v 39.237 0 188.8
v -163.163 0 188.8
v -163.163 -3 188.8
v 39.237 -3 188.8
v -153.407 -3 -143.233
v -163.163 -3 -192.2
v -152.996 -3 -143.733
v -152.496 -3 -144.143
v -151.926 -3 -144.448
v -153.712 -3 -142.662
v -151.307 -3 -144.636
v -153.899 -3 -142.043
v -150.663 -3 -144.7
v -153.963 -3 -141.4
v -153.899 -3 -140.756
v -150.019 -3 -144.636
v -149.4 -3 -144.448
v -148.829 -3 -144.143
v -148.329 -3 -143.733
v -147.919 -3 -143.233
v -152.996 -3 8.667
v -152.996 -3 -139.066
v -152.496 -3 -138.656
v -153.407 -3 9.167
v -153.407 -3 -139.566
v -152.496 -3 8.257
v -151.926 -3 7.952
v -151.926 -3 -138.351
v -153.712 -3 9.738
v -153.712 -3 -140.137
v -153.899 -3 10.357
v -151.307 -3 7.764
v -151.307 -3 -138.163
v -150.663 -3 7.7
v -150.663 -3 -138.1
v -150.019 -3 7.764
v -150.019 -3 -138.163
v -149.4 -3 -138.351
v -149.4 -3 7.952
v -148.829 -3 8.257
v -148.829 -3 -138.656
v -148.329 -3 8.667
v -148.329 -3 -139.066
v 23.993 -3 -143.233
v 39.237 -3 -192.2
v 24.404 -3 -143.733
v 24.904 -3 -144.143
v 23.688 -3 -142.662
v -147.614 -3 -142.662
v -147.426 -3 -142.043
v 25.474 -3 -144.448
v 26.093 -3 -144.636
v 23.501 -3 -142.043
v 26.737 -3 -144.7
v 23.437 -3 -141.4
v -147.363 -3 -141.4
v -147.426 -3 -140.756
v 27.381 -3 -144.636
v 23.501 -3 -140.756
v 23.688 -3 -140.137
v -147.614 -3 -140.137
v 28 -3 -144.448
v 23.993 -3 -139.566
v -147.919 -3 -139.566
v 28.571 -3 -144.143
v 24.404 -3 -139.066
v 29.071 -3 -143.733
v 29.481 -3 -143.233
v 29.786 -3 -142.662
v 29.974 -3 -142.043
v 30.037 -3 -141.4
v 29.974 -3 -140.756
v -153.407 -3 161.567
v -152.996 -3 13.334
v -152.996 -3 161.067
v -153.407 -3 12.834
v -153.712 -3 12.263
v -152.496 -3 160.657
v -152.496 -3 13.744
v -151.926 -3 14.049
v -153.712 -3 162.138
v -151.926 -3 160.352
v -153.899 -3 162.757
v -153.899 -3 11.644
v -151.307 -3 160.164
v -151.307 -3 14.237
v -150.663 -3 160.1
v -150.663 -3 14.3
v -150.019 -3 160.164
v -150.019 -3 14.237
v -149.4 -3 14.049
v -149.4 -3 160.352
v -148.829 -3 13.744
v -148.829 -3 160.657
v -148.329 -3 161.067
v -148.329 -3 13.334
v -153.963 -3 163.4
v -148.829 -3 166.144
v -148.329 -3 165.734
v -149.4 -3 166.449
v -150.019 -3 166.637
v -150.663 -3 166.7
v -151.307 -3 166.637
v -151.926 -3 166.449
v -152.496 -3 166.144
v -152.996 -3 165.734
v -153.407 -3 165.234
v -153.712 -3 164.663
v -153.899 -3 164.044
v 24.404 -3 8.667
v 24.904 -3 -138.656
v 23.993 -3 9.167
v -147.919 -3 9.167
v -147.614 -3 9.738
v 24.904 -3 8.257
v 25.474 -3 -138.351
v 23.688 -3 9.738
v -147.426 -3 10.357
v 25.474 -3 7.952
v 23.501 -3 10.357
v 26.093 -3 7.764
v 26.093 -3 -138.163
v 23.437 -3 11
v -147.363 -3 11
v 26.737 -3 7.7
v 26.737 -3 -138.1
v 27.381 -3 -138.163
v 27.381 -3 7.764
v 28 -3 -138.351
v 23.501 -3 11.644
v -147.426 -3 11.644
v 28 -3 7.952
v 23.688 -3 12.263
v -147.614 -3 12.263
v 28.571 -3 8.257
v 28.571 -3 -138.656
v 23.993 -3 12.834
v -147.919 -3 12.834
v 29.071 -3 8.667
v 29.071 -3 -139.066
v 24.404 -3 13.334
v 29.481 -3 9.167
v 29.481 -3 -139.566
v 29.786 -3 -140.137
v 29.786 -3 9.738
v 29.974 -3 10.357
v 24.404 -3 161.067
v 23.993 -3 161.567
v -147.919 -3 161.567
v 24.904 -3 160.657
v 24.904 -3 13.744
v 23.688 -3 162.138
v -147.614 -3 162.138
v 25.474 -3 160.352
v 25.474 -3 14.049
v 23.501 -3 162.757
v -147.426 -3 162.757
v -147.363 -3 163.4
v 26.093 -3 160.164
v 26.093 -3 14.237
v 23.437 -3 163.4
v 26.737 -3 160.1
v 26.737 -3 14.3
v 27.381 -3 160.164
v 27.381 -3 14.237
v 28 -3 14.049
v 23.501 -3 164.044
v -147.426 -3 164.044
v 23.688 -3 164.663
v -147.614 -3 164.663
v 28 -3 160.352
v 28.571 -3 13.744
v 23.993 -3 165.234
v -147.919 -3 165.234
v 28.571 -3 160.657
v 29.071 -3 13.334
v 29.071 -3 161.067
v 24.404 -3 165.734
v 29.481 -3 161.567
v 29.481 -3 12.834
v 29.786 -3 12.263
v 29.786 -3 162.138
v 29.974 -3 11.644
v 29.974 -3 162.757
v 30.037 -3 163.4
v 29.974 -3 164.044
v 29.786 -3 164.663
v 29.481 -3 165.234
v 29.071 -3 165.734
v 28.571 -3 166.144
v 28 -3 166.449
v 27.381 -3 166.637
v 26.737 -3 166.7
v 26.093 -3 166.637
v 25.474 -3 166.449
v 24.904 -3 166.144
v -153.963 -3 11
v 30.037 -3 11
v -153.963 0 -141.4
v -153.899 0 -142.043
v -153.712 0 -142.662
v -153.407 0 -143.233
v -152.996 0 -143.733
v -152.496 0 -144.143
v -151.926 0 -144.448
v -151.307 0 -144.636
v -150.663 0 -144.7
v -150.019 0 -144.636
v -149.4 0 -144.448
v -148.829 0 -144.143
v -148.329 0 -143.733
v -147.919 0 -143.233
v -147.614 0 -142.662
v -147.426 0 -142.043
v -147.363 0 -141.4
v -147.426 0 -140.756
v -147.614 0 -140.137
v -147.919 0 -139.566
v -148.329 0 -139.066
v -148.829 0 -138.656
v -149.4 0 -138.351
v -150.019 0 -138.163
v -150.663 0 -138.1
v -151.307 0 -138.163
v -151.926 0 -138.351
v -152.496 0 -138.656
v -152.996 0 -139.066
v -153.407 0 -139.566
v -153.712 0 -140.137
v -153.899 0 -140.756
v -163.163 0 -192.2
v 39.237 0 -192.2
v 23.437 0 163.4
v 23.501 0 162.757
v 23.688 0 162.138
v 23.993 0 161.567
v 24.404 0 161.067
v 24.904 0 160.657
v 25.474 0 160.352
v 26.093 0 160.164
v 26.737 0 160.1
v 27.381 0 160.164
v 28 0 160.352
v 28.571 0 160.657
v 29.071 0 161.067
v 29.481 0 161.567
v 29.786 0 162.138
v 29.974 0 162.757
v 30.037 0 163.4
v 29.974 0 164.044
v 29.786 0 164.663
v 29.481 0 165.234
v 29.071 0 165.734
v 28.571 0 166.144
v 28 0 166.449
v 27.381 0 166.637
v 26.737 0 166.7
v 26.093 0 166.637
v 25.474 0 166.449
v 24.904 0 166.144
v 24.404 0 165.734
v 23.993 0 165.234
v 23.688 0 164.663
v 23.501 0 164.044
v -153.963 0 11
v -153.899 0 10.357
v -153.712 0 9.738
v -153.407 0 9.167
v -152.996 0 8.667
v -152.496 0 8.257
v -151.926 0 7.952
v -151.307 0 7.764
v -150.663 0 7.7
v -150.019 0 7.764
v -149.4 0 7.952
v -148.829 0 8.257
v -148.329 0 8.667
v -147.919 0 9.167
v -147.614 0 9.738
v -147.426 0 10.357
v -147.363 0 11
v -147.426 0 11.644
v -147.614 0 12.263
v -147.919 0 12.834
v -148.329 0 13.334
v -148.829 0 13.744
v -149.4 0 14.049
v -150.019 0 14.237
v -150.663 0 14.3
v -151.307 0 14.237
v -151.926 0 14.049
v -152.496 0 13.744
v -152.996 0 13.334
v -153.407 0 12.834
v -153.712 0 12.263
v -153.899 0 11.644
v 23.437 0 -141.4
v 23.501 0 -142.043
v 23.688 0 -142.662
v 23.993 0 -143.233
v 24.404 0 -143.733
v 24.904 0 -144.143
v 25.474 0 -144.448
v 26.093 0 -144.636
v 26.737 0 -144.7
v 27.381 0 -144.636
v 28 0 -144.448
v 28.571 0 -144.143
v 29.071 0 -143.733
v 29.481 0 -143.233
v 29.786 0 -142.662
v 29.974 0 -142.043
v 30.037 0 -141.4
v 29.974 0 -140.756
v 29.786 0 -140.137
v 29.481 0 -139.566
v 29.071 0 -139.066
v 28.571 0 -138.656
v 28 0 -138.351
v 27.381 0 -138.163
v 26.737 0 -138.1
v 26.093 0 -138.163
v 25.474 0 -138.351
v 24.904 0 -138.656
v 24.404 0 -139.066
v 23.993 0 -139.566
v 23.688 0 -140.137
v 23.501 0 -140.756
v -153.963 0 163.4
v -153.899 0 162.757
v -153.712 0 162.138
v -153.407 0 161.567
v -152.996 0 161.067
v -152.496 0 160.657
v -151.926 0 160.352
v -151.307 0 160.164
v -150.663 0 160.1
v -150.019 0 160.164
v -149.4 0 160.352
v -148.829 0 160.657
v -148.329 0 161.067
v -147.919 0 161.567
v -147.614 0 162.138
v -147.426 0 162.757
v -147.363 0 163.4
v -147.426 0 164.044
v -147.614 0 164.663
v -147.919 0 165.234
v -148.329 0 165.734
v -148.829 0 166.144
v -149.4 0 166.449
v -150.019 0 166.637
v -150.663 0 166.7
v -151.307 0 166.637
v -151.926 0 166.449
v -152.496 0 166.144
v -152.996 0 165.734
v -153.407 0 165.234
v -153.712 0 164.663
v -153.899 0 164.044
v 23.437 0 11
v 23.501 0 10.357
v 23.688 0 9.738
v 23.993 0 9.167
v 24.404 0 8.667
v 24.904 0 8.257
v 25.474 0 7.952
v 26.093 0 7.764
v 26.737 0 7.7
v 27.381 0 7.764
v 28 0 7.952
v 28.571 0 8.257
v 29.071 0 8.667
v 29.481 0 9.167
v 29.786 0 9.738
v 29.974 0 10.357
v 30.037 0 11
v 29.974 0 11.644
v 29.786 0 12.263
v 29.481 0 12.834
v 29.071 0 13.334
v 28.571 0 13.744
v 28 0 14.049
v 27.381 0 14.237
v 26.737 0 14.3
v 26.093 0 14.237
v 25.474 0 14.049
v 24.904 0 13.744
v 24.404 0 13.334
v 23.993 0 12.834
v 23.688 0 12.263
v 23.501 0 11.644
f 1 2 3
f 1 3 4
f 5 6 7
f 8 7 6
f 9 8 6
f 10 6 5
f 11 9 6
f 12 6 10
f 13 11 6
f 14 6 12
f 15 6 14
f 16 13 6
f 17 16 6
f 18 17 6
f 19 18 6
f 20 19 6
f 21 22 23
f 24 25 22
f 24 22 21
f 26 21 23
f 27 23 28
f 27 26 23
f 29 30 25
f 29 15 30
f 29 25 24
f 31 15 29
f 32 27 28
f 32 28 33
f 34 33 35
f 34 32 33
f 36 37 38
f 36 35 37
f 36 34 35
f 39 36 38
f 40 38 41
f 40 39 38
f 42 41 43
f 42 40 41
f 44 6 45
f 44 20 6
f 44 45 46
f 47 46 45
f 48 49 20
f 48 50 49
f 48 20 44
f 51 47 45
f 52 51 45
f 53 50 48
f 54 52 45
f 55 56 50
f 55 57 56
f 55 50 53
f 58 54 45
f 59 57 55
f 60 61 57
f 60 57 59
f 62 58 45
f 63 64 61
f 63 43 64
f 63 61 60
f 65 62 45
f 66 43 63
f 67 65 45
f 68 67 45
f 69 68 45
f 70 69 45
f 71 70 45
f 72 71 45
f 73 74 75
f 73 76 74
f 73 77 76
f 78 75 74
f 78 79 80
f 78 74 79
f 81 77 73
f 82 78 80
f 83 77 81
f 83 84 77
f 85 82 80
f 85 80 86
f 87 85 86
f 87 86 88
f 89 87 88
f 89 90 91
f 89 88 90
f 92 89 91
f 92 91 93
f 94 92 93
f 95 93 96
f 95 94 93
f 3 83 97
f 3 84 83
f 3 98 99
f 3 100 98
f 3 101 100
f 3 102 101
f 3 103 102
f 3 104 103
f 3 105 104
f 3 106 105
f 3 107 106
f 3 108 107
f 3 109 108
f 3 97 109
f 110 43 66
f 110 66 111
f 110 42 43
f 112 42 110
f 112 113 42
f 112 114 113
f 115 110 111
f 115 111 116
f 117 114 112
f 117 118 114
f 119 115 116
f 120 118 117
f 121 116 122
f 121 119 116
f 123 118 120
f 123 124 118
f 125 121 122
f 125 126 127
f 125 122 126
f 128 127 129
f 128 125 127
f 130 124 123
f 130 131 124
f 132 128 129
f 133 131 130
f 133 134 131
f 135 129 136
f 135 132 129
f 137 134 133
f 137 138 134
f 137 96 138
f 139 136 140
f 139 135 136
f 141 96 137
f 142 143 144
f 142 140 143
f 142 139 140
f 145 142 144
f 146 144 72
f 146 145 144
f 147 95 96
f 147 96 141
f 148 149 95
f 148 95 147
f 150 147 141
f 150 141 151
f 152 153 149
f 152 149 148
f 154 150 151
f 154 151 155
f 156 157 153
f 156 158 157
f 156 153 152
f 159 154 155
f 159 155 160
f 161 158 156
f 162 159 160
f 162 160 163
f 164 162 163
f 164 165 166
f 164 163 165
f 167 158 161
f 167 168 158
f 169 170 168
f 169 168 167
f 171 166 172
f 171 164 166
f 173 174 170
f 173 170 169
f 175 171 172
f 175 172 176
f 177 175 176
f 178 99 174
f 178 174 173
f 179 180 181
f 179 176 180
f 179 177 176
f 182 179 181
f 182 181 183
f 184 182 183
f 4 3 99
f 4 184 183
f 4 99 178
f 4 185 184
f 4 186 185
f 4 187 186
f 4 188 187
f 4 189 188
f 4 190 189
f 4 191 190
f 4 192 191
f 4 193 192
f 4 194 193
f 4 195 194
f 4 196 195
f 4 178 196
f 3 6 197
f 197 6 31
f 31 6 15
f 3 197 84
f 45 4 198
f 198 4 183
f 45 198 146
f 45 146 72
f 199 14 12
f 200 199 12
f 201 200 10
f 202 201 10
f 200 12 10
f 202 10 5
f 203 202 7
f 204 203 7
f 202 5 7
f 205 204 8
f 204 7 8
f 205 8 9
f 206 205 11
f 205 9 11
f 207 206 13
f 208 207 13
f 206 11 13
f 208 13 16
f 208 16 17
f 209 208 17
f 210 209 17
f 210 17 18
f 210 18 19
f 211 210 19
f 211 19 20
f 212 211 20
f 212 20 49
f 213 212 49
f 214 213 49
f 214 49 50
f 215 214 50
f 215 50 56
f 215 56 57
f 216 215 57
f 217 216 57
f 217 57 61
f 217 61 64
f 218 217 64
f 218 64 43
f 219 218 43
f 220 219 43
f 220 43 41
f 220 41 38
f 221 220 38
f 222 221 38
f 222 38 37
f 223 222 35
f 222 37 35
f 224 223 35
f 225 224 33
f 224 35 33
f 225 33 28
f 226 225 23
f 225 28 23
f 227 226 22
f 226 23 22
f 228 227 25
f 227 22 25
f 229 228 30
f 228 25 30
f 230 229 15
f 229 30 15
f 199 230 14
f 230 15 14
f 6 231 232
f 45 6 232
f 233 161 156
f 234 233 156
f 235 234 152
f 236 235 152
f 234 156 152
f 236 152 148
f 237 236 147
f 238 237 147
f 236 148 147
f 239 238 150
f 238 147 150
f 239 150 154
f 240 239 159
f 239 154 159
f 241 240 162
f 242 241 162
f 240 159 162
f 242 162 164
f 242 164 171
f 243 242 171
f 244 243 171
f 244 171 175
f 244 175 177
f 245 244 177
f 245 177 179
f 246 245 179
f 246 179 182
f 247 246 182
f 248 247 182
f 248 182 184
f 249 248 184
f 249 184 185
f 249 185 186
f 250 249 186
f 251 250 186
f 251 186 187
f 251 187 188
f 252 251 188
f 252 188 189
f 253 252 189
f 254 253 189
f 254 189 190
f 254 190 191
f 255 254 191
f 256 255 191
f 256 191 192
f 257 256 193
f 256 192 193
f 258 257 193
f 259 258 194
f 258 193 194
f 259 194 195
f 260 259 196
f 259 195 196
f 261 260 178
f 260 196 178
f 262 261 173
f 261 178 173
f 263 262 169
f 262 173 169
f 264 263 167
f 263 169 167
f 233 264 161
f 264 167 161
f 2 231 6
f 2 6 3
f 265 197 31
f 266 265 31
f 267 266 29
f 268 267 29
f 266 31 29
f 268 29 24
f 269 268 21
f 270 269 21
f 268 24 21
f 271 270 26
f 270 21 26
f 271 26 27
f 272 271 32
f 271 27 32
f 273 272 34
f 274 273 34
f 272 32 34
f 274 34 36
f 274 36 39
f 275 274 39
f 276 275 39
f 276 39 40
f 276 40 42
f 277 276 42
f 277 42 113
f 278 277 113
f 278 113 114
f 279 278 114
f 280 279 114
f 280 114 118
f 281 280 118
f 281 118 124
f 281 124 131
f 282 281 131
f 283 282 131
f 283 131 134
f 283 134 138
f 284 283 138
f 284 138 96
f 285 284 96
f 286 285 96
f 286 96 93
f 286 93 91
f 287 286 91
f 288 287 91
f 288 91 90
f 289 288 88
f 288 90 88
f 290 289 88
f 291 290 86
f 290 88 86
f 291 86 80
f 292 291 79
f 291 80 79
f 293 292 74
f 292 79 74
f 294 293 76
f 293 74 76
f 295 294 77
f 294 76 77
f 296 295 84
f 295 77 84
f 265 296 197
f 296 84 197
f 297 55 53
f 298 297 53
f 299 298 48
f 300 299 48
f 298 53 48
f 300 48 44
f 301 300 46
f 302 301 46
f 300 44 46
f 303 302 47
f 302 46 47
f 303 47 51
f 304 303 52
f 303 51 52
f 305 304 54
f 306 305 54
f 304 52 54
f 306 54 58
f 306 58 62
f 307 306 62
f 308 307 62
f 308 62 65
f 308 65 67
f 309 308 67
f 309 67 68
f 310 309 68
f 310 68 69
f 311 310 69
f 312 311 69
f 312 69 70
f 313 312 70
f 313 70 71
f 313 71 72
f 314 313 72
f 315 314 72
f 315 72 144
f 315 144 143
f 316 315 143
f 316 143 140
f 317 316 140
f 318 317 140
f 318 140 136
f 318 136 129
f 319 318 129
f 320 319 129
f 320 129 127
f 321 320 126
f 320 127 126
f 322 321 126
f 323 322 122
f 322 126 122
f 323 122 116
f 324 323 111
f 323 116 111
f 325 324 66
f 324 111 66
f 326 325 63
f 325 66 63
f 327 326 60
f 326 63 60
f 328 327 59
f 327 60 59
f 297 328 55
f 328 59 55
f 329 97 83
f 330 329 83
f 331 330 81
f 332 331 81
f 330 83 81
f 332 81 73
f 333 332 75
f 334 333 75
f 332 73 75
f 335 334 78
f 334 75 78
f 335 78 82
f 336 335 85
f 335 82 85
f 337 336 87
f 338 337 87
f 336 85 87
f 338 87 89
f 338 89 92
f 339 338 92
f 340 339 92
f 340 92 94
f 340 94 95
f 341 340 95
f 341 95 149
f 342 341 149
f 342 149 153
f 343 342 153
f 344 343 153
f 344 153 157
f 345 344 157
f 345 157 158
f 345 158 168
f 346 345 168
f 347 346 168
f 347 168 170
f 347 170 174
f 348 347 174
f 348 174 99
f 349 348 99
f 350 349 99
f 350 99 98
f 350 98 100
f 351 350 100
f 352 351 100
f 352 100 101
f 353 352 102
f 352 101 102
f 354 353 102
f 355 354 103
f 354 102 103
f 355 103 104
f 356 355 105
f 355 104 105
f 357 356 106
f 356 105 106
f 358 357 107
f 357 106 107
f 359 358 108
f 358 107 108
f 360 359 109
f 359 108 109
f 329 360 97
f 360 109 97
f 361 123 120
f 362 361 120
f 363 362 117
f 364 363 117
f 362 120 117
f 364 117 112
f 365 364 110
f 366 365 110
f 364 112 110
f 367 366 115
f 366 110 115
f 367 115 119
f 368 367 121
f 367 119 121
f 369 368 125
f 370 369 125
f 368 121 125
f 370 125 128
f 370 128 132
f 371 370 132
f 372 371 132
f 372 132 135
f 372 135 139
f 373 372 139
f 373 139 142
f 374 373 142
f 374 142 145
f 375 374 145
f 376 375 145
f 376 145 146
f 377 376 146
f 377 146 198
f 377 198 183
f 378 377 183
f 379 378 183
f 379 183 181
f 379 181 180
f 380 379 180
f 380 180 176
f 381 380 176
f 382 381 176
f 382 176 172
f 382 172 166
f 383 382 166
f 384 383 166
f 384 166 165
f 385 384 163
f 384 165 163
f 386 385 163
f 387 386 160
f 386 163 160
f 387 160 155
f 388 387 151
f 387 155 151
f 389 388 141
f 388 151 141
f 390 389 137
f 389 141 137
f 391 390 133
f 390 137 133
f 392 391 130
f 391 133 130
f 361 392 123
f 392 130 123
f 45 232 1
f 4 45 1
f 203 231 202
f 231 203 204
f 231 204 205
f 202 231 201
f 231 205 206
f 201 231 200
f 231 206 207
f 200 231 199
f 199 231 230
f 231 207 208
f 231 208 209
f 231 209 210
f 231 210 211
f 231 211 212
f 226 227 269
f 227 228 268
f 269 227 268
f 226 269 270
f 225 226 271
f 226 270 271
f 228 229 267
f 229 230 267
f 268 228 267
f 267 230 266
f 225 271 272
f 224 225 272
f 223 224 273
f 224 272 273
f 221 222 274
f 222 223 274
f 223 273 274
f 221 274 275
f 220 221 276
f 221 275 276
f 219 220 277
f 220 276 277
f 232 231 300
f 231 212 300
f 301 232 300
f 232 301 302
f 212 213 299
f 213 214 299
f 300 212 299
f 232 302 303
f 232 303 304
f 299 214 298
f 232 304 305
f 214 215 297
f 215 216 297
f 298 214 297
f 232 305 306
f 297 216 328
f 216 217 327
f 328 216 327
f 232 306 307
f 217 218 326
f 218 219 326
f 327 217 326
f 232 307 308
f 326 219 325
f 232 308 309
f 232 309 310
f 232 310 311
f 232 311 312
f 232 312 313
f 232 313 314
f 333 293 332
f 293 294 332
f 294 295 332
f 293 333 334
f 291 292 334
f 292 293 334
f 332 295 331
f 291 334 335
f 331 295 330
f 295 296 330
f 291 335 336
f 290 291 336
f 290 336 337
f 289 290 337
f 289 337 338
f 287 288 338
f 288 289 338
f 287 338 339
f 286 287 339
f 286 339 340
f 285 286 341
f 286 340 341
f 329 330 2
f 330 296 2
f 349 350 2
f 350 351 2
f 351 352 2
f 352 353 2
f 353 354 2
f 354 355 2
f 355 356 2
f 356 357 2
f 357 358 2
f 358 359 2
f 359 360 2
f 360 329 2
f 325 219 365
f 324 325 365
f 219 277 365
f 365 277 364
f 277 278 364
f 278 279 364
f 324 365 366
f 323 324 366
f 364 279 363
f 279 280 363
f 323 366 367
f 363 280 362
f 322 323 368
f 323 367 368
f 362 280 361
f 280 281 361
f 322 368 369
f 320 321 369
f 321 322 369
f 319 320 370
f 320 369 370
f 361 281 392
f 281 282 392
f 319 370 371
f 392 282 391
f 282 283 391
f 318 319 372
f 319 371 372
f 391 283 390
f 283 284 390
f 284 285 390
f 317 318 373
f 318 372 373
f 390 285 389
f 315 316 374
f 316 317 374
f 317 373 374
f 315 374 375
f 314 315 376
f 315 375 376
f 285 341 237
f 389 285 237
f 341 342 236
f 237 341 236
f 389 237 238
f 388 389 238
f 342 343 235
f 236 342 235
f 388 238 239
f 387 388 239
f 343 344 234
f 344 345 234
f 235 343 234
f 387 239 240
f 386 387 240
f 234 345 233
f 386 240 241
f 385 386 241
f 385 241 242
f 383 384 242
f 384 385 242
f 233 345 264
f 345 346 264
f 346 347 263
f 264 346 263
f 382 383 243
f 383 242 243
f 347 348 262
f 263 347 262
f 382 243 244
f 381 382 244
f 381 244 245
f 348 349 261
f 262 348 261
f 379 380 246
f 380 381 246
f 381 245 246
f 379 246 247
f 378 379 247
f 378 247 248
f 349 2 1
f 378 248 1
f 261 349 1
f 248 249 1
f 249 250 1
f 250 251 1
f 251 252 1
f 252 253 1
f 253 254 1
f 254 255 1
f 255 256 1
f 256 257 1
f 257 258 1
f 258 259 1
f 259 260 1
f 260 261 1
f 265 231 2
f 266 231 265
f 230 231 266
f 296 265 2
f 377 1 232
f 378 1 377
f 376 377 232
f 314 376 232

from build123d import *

# Parameters (mm, degrees)
F0_W     = 202.4
F0_H     = 381
F1_DEPTH = 3
F2_D     = 6.6


with BuildPart() as f1:
    # F0 (on Front) → F1 (new body)
    with BuildSketch(Plane.XZ):
        with Locations((-61.9627135719, -1.6996394843)):
            Rectangle(F0_W, F0_H)
    extrude(amount=F1_DEPTH)

    # F2 (through all)
    with Locations(Plane(origin=(0, 0, 0), x_dir=(1, 0, 0), z_dir=(0, 1, 0))):
        with Locations((-150.6627135719, -163.4003605157), (-150.6627135719, -11.0003605157), (-150.6627135719, 141.3996394843), (26.7372864281, 141.3996394843), (26.7372864281, -11.0003605157), (26.7372864281, -163.4003605157)):
            Hole(F2_D / 2)


solid = f1.part
